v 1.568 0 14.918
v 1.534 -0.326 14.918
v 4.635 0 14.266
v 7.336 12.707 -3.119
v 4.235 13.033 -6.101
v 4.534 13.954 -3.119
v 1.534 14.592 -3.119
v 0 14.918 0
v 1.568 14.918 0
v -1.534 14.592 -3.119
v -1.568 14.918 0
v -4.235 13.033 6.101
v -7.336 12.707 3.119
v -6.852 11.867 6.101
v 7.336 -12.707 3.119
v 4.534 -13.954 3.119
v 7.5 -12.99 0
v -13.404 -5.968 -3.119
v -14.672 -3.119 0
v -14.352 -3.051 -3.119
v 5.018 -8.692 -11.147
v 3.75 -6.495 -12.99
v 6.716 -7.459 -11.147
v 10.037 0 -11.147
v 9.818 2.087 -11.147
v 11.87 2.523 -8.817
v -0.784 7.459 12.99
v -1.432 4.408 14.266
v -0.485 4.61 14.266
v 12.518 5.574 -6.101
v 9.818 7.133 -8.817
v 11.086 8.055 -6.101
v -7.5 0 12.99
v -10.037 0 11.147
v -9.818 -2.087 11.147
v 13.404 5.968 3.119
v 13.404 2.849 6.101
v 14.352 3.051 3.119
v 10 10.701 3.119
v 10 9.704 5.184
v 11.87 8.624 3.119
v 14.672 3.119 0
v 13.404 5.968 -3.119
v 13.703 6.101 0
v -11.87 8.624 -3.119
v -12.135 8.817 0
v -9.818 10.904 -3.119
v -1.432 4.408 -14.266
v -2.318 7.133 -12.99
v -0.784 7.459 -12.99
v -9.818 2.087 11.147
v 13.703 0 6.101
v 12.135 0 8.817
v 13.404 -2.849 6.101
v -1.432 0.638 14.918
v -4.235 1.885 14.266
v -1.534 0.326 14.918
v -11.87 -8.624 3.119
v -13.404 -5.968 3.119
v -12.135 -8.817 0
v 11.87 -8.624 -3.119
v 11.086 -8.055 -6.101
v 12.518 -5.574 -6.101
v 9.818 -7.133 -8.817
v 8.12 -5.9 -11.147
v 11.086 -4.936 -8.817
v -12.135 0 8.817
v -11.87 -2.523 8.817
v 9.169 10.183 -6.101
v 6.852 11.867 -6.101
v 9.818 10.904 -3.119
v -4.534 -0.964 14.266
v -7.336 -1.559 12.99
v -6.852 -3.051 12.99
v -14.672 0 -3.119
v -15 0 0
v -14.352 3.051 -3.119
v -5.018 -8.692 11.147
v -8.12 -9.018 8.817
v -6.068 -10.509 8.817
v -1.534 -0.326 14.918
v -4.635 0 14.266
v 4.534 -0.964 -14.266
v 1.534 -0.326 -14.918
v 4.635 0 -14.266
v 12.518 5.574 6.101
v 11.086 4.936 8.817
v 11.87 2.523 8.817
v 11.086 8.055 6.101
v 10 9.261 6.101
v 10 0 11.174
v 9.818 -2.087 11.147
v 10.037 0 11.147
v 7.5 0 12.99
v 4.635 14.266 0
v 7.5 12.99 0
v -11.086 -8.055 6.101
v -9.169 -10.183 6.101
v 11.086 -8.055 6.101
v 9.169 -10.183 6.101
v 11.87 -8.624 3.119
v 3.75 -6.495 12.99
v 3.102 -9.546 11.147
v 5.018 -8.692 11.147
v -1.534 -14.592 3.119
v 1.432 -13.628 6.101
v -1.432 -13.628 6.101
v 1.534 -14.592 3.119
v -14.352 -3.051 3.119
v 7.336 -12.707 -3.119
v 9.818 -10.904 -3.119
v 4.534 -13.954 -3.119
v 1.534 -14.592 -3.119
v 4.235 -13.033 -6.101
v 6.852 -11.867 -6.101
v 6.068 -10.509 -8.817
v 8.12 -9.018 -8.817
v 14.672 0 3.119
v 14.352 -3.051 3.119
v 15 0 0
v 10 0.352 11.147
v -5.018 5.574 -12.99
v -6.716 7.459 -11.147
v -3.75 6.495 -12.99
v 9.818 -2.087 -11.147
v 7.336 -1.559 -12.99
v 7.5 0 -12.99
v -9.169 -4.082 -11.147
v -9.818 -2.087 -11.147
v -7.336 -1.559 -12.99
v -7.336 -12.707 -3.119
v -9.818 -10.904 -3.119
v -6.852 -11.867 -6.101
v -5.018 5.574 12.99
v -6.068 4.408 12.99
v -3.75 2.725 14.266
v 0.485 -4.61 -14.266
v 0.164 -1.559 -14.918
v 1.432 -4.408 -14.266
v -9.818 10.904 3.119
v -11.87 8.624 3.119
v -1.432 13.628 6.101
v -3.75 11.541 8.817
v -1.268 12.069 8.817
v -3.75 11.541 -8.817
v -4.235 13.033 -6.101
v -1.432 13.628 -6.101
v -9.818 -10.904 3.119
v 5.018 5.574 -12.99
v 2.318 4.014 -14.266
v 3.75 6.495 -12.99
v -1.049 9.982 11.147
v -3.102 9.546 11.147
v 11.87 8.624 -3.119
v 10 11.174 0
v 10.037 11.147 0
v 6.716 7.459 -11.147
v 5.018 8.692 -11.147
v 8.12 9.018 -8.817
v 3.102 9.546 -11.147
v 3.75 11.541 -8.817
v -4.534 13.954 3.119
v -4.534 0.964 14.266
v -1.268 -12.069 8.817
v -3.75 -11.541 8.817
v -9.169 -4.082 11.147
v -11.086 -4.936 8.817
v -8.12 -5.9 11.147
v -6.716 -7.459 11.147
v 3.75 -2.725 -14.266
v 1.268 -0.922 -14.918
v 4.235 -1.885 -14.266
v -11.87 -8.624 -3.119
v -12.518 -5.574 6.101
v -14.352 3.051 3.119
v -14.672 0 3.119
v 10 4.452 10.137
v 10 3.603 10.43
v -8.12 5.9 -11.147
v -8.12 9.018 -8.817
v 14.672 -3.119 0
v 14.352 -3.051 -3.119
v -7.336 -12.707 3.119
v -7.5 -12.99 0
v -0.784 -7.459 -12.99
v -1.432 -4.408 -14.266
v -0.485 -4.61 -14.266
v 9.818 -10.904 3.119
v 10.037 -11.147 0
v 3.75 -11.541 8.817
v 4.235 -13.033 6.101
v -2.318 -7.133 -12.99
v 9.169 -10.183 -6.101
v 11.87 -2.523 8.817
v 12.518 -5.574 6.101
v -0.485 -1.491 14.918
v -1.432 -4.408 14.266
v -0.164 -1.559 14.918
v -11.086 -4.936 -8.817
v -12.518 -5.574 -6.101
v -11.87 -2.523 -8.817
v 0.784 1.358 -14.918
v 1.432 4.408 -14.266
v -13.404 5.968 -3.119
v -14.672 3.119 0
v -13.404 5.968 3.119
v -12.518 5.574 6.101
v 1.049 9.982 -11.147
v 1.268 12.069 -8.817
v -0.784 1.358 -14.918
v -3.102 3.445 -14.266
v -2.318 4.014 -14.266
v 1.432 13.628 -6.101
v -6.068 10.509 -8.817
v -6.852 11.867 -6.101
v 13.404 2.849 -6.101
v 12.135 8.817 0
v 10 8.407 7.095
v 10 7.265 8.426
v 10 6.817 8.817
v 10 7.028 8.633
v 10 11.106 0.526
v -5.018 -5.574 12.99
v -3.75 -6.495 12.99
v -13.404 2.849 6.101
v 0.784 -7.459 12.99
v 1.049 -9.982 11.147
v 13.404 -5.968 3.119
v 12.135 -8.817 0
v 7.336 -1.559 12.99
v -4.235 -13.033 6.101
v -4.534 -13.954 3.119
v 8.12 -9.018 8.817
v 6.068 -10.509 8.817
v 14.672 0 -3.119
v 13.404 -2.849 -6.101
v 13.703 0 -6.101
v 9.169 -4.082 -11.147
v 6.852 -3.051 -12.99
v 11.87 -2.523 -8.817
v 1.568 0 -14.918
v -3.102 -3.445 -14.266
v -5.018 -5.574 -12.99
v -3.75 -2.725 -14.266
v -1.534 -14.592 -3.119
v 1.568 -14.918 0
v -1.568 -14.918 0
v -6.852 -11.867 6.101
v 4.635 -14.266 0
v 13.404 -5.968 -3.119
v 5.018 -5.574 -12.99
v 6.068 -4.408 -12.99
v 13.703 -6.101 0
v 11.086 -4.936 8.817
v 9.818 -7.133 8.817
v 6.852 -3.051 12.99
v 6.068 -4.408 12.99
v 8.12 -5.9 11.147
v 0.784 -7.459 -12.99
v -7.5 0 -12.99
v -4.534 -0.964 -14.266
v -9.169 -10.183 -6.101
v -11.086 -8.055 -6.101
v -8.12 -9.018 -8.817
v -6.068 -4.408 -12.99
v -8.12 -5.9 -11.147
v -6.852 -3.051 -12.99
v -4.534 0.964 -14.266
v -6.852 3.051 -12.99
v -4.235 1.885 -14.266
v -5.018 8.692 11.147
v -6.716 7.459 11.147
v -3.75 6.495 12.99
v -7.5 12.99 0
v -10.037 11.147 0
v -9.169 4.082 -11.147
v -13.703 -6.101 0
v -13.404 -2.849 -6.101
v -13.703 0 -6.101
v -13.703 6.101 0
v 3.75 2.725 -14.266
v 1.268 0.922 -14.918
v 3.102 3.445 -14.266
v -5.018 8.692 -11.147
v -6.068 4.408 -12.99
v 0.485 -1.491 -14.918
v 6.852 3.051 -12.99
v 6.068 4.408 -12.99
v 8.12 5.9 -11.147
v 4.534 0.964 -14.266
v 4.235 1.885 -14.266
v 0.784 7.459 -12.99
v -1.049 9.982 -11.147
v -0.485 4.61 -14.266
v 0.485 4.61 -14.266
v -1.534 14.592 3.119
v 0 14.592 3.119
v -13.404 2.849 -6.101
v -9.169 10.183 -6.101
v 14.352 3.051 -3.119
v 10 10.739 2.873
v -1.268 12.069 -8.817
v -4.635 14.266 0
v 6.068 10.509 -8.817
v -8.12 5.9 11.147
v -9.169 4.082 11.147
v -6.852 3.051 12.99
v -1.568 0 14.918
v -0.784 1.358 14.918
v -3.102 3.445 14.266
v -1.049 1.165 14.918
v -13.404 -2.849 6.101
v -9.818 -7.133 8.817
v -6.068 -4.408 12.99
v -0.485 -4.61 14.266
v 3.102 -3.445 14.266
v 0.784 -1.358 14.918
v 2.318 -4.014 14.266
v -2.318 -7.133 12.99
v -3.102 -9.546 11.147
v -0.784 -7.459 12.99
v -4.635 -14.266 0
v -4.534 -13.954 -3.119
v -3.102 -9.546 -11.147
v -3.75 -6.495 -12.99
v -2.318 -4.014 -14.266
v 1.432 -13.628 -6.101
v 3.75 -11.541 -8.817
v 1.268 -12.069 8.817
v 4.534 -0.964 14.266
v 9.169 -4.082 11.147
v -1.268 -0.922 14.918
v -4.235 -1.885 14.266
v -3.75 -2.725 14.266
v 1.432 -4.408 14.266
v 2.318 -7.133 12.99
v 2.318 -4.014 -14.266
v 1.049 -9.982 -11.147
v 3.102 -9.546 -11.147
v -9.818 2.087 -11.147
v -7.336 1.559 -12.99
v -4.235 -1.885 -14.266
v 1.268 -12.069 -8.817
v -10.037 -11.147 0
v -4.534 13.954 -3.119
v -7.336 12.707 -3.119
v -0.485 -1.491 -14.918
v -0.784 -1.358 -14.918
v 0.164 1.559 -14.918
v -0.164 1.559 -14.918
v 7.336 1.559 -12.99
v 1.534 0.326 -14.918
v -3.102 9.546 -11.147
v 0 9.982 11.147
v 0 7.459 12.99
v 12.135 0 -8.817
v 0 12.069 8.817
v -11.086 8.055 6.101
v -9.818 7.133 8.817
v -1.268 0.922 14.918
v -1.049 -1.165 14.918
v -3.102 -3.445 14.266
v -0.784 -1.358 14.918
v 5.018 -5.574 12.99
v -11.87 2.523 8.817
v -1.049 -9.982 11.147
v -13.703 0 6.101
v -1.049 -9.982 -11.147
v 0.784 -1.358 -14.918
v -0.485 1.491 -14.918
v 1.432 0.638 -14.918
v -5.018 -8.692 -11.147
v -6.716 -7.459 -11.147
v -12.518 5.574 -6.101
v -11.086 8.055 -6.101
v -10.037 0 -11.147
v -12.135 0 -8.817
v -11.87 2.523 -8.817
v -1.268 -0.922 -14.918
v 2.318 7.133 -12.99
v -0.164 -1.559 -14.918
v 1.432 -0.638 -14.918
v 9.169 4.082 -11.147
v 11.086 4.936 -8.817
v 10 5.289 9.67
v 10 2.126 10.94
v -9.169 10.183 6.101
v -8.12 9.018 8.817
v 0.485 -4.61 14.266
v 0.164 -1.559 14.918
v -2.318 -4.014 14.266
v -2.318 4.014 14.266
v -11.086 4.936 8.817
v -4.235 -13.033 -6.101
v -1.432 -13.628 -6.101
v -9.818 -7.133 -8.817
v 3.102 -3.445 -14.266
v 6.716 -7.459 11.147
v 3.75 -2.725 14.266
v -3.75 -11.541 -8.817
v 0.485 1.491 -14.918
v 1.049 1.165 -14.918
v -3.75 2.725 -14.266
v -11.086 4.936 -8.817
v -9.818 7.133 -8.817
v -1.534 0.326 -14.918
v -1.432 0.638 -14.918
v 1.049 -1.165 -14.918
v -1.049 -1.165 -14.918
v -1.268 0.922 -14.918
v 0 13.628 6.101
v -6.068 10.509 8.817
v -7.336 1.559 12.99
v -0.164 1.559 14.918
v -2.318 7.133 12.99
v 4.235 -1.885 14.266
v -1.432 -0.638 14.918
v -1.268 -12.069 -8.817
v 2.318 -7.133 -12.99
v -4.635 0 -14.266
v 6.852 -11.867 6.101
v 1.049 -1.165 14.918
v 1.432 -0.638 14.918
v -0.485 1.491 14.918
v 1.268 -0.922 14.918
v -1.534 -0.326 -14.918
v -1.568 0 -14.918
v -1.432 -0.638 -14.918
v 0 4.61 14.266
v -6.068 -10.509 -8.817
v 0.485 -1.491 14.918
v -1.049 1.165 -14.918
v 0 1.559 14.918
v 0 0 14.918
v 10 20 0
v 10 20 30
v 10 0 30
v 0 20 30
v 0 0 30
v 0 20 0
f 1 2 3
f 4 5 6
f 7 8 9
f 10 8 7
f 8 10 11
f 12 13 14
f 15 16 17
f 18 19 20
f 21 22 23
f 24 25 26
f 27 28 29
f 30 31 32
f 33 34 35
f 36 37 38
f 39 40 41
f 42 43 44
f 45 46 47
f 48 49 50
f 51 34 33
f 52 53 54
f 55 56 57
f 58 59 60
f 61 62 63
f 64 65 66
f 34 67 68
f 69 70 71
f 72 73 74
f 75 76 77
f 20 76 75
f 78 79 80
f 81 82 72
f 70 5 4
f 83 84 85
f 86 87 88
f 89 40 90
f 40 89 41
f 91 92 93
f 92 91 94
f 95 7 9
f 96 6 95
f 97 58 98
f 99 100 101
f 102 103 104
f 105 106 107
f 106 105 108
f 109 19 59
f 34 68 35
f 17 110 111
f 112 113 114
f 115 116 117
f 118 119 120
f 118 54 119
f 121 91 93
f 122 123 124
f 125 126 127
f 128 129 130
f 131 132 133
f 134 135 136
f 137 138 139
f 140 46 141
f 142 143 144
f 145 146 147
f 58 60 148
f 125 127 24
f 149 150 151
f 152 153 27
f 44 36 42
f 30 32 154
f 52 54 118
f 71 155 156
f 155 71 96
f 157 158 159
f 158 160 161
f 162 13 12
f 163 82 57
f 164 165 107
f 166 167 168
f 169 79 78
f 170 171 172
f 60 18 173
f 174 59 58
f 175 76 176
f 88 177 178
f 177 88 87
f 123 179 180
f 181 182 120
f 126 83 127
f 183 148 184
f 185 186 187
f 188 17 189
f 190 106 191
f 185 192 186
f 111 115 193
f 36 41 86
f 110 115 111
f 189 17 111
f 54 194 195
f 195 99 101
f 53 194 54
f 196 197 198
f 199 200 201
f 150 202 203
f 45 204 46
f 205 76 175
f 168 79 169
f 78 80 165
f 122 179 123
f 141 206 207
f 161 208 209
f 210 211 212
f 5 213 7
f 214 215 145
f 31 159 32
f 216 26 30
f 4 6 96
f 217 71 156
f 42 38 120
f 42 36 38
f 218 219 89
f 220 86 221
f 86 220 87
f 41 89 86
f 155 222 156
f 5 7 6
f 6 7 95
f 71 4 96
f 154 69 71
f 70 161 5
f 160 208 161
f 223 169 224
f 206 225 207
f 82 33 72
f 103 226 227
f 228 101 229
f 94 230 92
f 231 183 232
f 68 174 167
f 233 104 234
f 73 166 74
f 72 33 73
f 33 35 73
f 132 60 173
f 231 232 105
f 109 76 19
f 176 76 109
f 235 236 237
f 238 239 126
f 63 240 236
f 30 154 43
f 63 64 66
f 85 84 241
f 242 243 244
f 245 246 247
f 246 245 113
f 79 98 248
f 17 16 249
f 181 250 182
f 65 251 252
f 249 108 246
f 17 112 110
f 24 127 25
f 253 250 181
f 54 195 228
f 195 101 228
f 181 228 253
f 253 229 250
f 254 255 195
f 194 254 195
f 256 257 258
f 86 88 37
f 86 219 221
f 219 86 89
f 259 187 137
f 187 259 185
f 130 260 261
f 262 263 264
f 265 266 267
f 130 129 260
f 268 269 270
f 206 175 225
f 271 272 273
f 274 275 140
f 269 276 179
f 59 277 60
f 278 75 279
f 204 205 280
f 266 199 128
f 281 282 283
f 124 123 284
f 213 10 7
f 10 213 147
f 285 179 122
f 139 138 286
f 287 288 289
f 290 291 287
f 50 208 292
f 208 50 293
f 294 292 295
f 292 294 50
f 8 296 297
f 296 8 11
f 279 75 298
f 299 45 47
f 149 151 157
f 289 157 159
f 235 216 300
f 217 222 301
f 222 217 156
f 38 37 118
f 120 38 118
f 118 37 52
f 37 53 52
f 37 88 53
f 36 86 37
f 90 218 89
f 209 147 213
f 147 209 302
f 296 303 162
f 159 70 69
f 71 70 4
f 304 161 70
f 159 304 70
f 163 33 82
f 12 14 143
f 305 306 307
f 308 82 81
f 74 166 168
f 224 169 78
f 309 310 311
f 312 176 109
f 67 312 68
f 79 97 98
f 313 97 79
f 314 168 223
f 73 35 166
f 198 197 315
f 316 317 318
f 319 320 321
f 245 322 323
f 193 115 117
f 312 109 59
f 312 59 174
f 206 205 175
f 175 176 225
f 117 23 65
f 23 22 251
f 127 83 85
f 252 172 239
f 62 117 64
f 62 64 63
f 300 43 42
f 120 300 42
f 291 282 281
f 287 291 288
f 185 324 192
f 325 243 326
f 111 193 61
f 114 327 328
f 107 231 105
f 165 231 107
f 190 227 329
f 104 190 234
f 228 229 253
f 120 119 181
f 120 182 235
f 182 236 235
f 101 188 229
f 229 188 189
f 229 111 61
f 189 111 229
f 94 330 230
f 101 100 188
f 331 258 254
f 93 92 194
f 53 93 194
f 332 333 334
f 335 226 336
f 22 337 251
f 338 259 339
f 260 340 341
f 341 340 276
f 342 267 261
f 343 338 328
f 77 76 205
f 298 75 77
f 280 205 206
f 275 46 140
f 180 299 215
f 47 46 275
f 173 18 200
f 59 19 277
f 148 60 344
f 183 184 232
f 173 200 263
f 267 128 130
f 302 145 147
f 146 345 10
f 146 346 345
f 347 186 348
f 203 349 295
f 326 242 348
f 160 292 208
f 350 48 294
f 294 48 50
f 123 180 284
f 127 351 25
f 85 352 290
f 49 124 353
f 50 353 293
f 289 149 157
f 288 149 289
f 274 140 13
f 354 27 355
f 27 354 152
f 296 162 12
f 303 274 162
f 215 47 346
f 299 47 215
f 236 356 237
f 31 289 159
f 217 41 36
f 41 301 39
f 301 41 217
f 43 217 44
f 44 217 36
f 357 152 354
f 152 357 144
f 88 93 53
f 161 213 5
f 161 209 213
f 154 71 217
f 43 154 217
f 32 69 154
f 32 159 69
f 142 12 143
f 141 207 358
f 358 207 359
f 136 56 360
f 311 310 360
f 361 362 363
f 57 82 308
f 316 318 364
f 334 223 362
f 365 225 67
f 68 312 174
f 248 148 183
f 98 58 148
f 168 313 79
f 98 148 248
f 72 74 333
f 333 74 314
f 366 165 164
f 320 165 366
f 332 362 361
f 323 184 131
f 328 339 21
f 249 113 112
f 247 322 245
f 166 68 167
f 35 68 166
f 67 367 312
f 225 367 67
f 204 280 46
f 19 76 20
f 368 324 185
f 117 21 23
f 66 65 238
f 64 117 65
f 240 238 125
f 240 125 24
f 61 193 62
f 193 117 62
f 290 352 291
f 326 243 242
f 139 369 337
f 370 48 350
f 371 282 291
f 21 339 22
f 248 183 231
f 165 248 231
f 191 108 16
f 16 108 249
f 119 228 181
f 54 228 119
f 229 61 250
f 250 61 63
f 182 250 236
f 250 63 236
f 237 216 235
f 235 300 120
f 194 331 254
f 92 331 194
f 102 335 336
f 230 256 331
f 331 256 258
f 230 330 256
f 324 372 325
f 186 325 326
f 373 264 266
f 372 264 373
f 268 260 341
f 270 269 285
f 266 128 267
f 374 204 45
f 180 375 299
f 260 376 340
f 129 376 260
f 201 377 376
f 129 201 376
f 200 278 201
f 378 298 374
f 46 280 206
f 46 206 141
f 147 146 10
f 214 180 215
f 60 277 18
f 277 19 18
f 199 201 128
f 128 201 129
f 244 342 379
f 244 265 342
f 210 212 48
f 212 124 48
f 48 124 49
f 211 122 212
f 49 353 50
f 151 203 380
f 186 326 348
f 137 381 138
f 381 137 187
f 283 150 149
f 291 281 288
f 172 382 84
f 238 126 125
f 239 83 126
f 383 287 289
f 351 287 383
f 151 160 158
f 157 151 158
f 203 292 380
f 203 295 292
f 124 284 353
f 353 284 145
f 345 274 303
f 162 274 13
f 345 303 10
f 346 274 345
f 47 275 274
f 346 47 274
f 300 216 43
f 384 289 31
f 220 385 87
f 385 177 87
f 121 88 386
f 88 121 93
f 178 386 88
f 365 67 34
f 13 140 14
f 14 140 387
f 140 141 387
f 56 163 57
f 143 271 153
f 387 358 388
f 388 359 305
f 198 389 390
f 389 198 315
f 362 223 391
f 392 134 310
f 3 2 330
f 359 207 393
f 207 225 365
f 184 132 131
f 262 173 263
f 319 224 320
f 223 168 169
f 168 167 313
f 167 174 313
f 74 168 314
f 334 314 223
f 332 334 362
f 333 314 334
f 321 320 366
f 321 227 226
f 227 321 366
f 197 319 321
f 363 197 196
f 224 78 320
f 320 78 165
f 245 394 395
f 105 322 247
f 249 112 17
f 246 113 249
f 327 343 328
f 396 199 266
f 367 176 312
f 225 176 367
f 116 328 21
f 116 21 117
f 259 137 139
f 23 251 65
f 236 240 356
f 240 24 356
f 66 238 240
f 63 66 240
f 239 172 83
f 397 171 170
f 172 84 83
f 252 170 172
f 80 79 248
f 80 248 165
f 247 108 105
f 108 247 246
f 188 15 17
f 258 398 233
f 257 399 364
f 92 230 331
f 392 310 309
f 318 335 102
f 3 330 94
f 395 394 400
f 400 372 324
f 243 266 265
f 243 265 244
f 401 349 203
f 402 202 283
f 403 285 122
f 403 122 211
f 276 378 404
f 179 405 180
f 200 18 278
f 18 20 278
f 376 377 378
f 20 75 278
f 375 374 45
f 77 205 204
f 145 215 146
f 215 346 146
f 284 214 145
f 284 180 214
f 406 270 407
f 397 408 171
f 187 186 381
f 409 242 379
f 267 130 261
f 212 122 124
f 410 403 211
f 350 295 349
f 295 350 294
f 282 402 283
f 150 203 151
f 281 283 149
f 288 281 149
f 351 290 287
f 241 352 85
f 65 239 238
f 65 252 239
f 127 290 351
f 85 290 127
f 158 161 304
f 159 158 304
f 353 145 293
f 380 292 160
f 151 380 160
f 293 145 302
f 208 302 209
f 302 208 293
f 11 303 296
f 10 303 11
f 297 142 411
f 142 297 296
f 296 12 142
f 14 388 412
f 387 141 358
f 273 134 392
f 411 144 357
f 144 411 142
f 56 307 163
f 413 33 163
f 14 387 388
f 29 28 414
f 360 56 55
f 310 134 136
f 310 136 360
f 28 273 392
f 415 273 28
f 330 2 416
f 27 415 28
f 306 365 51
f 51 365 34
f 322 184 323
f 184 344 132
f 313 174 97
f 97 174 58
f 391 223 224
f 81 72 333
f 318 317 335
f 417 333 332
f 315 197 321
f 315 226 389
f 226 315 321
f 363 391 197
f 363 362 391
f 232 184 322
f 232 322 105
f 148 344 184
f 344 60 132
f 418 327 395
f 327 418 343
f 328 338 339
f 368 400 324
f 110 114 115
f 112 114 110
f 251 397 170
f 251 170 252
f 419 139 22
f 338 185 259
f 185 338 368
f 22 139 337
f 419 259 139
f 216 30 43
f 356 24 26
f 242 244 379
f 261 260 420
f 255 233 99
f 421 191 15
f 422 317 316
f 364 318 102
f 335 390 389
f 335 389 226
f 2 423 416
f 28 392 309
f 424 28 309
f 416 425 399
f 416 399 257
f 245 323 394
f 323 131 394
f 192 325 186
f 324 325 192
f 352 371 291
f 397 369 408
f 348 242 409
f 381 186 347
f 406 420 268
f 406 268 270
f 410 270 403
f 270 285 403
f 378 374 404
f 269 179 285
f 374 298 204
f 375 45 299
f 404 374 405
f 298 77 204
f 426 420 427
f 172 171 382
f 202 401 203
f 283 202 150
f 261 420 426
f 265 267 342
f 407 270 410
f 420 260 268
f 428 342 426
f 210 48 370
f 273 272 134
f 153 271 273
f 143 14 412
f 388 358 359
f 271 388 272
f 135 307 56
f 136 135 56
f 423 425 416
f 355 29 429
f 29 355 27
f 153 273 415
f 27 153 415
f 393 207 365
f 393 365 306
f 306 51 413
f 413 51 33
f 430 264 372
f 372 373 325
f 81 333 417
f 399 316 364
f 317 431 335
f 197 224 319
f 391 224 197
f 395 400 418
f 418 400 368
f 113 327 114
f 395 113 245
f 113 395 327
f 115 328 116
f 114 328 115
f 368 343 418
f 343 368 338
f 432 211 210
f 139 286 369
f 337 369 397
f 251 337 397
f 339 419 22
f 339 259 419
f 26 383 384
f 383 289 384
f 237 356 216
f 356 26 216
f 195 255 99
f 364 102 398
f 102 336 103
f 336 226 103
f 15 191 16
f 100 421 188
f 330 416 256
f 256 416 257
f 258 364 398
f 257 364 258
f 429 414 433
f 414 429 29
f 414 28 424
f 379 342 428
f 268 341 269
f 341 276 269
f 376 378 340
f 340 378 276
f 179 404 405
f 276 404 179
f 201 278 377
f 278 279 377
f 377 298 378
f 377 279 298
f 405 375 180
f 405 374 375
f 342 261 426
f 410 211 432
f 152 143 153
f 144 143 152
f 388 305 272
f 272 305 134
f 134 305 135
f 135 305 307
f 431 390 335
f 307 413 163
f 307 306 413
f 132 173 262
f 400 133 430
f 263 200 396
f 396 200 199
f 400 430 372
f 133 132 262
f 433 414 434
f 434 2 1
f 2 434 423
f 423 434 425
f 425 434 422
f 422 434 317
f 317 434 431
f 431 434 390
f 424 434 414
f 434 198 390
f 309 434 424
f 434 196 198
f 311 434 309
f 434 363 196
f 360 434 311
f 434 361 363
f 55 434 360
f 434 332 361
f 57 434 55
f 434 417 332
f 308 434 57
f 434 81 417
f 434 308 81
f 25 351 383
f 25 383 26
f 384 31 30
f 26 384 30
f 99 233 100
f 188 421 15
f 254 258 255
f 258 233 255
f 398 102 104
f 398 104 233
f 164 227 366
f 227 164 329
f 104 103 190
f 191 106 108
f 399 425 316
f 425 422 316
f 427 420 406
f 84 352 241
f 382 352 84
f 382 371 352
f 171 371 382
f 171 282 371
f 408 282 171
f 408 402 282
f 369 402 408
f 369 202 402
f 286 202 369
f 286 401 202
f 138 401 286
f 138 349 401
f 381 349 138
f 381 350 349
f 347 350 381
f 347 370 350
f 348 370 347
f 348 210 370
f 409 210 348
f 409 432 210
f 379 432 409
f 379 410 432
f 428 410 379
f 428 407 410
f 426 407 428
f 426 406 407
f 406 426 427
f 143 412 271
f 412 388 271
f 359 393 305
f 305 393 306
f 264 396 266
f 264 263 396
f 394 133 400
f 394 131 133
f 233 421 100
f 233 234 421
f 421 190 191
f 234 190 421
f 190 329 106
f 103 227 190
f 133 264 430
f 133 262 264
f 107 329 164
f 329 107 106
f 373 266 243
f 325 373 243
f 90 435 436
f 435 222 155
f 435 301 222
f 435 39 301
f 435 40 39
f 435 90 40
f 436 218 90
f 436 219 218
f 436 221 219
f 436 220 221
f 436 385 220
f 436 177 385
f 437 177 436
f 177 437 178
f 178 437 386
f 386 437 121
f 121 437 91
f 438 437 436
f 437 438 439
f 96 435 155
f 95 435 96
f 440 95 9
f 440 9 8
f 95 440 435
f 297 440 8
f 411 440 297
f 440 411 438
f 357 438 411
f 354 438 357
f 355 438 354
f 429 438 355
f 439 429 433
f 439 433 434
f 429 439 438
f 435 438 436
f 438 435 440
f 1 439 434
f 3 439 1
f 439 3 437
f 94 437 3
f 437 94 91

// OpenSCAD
union() {
sphere(d=30);
cube(size=[10,20,30]);
}

/*
<json>
    {
        "Name": "Vertical Pillars",
        "Desc": "Use the slider to indicate how many columns printed acceptably.",
        "LowKeyword": "Lost",
        "HighKeyword": "Printed",
        "varBase": "VarBase1",
        "minDefault": 0.1,
        "maxDefault": 2,
        "minDefaultND": "0.5 * nozzleDiameter",
        "maxDefaultND": "5 * nozzleDiameter",
        "cameraData": "-2.28,2.59,6.06,59.9,0,13.8,113.4",
        "sortOrder": 0,
		"instanceCount": 10
    }
</json>
*/
